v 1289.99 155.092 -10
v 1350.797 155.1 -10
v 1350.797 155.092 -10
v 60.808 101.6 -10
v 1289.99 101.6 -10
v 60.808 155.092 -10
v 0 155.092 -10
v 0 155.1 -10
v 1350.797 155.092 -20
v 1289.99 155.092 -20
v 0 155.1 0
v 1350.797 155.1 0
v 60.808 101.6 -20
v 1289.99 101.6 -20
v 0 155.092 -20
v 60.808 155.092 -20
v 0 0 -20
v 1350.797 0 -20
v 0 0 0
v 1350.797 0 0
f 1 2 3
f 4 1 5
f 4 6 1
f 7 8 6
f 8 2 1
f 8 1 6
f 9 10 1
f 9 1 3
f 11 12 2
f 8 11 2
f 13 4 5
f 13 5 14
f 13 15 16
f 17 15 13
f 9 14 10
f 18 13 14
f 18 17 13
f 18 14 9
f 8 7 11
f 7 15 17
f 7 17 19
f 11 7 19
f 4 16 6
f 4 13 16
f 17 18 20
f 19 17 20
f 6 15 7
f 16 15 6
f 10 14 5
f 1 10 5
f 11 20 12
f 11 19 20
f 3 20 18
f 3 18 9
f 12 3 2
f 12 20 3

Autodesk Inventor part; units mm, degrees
ref_plane "YZ Plane" through (0, 0, 0) normal (1, 0, 0) x (0, 1, 0)
ref_plane "XZ Plane" through (0, 0, 0) normal (0, 1, 0) x (-1, 0, 0)
ref_plane "XY Plane" through (0, 0, 0) normal (0, 0, 1) x (1, 0, 0)
sketch "Sketch1" plane through (0, 0, 0) normal (1, 0, 0) x (0, 1, 0)
  line L0 (0, 0) -> (155.1, 0)
  line L1 (155.1, 0) -> (155.1, -10)
  line L2 (0, -20) -> (0, 0)
  line L3 (155.1, -10) -> (101.6, -10)
  line L4 (101.6, -10) -> (101.6, -20)
  line L5 (101.6, -20) -> (0, -20)
  dimension "d3" = 53.5
  dimension "d4" = 155.1
  dimension "d5" = 10
  dimension "d6" = 10
  dimension "d7" = 20
  dimension "d18" = 101.6
extrude "Extrusion1" add sketch "Sketch1" along normal blind 1350.7974
sketch "Sketch3" plane through (0, 101.6, -10) normal (0, 1, 0) x (1, 0, 0)
  line L0 (1350.7974, -10) -> (1350.7974, 10) projected
  line L1 (1350.7974, 10) -> (1289.9898, 10)
  line L2 (1289.9898, 10) -> (1289.9898, 0)
  line L3 (0, 0) -> (1350.7974, 0) projected
  line L4 (0, 10) -> (0, -10) projected
  line L5 (0, 10) -> (60.8076, 10)
  line L6 (60.8076, 10) -> (60.8076, 0)
  dimension "d19" = 60.8076
  dimension "d20" = 60.8076
extrude "Extrusion2" add sketch "Sketch3" along normal blind 53.4924 contours L3 L2 L1 L0
sketch "Sketch4" plane through (0, 101.6, -20) normal (0, 1, 0) x (1, 0, 0)
  line L0 (1350.7974, -10) -> (1350.7974, 10)
  line L1 (1350.7974, 10) -> (1289.9898, 10)
  line L2 (1289.9898, 10) -> (1289.9898, 0)
  line L3 (0, 0) -> (1350.7974, 0)
  line L4 (0, 10) -> (60.8076, 10)
  line L5 (60.8076, 10) -> (60.8076, 0)
  line L6 (0, 10) -> (0, 0)
  line L7 (0, -20) -> (0, -10) projected
  line L8 (0, 0) -> (0, -20)
  line L9 (60.8076, 0) -> (60.8076, -10)
  line L10 (0, -10) -> (1350.7974, -10) projected
  line L11 (0, -10) -> (60.8076, -10)
  line L12 (0, -10) -> (0, 0)
  dimension "d23" = 60.8076
  dimension "d24" = 60.8076
  dimension "d25" = 10
  dimension "d26" = 20
extrude "Extrusion3" add sketch "Sketch4" along normal blind 53.4924 contours L10 L8 L3 L9
properties part number "SkinnySideL" material "Wood (Birch)"
